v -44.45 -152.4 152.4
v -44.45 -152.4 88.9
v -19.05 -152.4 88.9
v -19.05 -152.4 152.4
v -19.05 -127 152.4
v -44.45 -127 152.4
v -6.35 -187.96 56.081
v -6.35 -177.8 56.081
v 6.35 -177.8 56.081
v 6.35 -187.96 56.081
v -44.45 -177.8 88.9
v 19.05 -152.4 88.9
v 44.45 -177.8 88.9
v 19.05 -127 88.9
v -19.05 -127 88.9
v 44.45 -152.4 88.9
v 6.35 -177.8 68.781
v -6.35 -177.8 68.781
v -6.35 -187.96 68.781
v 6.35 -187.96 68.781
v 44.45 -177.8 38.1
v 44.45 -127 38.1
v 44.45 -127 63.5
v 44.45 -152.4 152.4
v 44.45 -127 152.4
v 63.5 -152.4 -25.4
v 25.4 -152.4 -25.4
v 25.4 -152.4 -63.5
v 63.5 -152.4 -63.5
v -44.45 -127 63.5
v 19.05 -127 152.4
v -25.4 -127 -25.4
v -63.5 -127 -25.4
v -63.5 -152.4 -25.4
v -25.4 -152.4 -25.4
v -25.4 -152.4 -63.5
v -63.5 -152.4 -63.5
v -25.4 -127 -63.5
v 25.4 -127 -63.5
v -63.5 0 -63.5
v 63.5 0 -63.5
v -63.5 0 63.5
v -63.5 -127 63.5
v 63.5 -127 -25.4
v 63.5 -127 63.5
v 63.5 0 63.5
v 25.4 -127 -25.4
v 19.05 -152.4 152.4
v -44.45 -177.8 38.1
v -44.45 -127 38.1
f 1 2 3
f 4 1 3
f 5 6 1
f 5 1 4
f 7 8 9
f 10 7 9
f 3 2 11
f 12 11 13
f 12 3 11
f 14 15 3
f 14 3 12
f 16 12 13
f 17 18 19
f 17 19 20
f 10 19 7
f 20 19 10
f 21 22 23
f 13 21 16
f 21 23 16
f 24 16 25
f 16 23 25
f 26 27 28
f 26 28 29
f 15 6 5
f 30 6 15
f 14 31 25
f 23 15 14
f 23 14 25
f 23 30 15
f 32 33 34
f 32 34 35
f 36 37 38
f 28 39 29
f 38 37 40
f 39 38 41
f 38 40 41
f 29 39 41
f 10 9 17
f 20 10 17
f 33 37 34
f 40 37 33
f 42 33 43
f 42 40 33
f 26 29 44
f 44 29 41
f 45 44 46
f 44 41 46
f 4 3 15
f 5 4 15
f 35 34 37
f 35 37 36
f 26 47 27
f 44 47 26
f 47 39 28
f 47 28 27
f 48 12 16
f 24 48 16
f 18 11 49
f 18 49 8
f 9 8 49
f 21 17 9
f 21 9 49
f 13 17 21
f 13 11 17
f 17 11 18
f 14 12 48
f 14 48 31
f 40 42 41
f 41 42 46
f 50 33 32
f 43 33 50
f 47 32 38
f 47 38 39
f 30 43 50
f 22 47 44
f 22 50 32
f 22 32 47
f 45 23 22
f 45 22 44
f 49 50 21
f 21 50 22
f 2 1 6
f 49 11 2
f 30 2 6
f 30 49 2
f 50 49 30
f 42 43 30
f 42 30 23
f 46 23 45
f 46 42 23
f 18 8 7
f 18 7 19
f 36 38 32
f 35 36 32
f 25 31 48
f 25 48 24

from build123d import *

# Parameters (mm, degrees)
F0_W     = 127
F0_H     = 127
F1_DEPTH = 127
F2_W     = 38.1
F2_H     = 38.1
F3_DEPTH = 25.4
F4_W     = 88.9
F4_H     = 25.4
F5_DEPTH = 50.8
F6_W     = 25.4
F6_H     = 25.4
F7_DEPTH = 63.5
F8_W     = 12.7
F8_H     = 12.7
F9_DEPTH = 10.16


with BuildPart() as f1:
    # F0 (on Front) → F1 (new body)
    with BuildSketch(Plane.XZ):
        Rectangle(F0_W, F0_H)
    extrude(amount=F1_DEPTH)

    # F2 (on face) → F3 (join)
    with BuildSketch(Plane.XZ.offset(127)):
        with Locations((-44.45, -44.45)):
            Rectangle(F2_W, F2_H)
        with Locations((44.45, -44.45)):
            Rectangle(F2_W, F2_H)
    extrude(amount=F3_DEPTH)

    # F4 (on face) → F5 (join)
    with BuildSketch(Plane.XZ.offset(127)):
        with Locations((0, 76.2)):
            Rectangle(F4_W, F4_H)
        with Locations((0, 50.8)):
            Rectangle(F4_W, F4_H)
    extrude(amount=F5_DEPTH)

    # F6 (on face) → F7 (join)
    with BuildSketch(Plane.XY.offset(88.9)):
        with Locations((-31.75, -139.7)):
            Rectangle(F6_W, F6_H)
        with Locations((31.75, -139.7)):
            Rectangle(F6_W, F6_H)
    extrude(amount=F7_DEPTH)

    # F8 (on face) → F9 (join)
    with BuildSketch(Plane.XZ.offset(177.8)):
        with Locations((0, 62.430865)):
            Rectangle(F8_W, F8_H)
    extrude(amount=F9_DEPTH)


solid = f1.part
